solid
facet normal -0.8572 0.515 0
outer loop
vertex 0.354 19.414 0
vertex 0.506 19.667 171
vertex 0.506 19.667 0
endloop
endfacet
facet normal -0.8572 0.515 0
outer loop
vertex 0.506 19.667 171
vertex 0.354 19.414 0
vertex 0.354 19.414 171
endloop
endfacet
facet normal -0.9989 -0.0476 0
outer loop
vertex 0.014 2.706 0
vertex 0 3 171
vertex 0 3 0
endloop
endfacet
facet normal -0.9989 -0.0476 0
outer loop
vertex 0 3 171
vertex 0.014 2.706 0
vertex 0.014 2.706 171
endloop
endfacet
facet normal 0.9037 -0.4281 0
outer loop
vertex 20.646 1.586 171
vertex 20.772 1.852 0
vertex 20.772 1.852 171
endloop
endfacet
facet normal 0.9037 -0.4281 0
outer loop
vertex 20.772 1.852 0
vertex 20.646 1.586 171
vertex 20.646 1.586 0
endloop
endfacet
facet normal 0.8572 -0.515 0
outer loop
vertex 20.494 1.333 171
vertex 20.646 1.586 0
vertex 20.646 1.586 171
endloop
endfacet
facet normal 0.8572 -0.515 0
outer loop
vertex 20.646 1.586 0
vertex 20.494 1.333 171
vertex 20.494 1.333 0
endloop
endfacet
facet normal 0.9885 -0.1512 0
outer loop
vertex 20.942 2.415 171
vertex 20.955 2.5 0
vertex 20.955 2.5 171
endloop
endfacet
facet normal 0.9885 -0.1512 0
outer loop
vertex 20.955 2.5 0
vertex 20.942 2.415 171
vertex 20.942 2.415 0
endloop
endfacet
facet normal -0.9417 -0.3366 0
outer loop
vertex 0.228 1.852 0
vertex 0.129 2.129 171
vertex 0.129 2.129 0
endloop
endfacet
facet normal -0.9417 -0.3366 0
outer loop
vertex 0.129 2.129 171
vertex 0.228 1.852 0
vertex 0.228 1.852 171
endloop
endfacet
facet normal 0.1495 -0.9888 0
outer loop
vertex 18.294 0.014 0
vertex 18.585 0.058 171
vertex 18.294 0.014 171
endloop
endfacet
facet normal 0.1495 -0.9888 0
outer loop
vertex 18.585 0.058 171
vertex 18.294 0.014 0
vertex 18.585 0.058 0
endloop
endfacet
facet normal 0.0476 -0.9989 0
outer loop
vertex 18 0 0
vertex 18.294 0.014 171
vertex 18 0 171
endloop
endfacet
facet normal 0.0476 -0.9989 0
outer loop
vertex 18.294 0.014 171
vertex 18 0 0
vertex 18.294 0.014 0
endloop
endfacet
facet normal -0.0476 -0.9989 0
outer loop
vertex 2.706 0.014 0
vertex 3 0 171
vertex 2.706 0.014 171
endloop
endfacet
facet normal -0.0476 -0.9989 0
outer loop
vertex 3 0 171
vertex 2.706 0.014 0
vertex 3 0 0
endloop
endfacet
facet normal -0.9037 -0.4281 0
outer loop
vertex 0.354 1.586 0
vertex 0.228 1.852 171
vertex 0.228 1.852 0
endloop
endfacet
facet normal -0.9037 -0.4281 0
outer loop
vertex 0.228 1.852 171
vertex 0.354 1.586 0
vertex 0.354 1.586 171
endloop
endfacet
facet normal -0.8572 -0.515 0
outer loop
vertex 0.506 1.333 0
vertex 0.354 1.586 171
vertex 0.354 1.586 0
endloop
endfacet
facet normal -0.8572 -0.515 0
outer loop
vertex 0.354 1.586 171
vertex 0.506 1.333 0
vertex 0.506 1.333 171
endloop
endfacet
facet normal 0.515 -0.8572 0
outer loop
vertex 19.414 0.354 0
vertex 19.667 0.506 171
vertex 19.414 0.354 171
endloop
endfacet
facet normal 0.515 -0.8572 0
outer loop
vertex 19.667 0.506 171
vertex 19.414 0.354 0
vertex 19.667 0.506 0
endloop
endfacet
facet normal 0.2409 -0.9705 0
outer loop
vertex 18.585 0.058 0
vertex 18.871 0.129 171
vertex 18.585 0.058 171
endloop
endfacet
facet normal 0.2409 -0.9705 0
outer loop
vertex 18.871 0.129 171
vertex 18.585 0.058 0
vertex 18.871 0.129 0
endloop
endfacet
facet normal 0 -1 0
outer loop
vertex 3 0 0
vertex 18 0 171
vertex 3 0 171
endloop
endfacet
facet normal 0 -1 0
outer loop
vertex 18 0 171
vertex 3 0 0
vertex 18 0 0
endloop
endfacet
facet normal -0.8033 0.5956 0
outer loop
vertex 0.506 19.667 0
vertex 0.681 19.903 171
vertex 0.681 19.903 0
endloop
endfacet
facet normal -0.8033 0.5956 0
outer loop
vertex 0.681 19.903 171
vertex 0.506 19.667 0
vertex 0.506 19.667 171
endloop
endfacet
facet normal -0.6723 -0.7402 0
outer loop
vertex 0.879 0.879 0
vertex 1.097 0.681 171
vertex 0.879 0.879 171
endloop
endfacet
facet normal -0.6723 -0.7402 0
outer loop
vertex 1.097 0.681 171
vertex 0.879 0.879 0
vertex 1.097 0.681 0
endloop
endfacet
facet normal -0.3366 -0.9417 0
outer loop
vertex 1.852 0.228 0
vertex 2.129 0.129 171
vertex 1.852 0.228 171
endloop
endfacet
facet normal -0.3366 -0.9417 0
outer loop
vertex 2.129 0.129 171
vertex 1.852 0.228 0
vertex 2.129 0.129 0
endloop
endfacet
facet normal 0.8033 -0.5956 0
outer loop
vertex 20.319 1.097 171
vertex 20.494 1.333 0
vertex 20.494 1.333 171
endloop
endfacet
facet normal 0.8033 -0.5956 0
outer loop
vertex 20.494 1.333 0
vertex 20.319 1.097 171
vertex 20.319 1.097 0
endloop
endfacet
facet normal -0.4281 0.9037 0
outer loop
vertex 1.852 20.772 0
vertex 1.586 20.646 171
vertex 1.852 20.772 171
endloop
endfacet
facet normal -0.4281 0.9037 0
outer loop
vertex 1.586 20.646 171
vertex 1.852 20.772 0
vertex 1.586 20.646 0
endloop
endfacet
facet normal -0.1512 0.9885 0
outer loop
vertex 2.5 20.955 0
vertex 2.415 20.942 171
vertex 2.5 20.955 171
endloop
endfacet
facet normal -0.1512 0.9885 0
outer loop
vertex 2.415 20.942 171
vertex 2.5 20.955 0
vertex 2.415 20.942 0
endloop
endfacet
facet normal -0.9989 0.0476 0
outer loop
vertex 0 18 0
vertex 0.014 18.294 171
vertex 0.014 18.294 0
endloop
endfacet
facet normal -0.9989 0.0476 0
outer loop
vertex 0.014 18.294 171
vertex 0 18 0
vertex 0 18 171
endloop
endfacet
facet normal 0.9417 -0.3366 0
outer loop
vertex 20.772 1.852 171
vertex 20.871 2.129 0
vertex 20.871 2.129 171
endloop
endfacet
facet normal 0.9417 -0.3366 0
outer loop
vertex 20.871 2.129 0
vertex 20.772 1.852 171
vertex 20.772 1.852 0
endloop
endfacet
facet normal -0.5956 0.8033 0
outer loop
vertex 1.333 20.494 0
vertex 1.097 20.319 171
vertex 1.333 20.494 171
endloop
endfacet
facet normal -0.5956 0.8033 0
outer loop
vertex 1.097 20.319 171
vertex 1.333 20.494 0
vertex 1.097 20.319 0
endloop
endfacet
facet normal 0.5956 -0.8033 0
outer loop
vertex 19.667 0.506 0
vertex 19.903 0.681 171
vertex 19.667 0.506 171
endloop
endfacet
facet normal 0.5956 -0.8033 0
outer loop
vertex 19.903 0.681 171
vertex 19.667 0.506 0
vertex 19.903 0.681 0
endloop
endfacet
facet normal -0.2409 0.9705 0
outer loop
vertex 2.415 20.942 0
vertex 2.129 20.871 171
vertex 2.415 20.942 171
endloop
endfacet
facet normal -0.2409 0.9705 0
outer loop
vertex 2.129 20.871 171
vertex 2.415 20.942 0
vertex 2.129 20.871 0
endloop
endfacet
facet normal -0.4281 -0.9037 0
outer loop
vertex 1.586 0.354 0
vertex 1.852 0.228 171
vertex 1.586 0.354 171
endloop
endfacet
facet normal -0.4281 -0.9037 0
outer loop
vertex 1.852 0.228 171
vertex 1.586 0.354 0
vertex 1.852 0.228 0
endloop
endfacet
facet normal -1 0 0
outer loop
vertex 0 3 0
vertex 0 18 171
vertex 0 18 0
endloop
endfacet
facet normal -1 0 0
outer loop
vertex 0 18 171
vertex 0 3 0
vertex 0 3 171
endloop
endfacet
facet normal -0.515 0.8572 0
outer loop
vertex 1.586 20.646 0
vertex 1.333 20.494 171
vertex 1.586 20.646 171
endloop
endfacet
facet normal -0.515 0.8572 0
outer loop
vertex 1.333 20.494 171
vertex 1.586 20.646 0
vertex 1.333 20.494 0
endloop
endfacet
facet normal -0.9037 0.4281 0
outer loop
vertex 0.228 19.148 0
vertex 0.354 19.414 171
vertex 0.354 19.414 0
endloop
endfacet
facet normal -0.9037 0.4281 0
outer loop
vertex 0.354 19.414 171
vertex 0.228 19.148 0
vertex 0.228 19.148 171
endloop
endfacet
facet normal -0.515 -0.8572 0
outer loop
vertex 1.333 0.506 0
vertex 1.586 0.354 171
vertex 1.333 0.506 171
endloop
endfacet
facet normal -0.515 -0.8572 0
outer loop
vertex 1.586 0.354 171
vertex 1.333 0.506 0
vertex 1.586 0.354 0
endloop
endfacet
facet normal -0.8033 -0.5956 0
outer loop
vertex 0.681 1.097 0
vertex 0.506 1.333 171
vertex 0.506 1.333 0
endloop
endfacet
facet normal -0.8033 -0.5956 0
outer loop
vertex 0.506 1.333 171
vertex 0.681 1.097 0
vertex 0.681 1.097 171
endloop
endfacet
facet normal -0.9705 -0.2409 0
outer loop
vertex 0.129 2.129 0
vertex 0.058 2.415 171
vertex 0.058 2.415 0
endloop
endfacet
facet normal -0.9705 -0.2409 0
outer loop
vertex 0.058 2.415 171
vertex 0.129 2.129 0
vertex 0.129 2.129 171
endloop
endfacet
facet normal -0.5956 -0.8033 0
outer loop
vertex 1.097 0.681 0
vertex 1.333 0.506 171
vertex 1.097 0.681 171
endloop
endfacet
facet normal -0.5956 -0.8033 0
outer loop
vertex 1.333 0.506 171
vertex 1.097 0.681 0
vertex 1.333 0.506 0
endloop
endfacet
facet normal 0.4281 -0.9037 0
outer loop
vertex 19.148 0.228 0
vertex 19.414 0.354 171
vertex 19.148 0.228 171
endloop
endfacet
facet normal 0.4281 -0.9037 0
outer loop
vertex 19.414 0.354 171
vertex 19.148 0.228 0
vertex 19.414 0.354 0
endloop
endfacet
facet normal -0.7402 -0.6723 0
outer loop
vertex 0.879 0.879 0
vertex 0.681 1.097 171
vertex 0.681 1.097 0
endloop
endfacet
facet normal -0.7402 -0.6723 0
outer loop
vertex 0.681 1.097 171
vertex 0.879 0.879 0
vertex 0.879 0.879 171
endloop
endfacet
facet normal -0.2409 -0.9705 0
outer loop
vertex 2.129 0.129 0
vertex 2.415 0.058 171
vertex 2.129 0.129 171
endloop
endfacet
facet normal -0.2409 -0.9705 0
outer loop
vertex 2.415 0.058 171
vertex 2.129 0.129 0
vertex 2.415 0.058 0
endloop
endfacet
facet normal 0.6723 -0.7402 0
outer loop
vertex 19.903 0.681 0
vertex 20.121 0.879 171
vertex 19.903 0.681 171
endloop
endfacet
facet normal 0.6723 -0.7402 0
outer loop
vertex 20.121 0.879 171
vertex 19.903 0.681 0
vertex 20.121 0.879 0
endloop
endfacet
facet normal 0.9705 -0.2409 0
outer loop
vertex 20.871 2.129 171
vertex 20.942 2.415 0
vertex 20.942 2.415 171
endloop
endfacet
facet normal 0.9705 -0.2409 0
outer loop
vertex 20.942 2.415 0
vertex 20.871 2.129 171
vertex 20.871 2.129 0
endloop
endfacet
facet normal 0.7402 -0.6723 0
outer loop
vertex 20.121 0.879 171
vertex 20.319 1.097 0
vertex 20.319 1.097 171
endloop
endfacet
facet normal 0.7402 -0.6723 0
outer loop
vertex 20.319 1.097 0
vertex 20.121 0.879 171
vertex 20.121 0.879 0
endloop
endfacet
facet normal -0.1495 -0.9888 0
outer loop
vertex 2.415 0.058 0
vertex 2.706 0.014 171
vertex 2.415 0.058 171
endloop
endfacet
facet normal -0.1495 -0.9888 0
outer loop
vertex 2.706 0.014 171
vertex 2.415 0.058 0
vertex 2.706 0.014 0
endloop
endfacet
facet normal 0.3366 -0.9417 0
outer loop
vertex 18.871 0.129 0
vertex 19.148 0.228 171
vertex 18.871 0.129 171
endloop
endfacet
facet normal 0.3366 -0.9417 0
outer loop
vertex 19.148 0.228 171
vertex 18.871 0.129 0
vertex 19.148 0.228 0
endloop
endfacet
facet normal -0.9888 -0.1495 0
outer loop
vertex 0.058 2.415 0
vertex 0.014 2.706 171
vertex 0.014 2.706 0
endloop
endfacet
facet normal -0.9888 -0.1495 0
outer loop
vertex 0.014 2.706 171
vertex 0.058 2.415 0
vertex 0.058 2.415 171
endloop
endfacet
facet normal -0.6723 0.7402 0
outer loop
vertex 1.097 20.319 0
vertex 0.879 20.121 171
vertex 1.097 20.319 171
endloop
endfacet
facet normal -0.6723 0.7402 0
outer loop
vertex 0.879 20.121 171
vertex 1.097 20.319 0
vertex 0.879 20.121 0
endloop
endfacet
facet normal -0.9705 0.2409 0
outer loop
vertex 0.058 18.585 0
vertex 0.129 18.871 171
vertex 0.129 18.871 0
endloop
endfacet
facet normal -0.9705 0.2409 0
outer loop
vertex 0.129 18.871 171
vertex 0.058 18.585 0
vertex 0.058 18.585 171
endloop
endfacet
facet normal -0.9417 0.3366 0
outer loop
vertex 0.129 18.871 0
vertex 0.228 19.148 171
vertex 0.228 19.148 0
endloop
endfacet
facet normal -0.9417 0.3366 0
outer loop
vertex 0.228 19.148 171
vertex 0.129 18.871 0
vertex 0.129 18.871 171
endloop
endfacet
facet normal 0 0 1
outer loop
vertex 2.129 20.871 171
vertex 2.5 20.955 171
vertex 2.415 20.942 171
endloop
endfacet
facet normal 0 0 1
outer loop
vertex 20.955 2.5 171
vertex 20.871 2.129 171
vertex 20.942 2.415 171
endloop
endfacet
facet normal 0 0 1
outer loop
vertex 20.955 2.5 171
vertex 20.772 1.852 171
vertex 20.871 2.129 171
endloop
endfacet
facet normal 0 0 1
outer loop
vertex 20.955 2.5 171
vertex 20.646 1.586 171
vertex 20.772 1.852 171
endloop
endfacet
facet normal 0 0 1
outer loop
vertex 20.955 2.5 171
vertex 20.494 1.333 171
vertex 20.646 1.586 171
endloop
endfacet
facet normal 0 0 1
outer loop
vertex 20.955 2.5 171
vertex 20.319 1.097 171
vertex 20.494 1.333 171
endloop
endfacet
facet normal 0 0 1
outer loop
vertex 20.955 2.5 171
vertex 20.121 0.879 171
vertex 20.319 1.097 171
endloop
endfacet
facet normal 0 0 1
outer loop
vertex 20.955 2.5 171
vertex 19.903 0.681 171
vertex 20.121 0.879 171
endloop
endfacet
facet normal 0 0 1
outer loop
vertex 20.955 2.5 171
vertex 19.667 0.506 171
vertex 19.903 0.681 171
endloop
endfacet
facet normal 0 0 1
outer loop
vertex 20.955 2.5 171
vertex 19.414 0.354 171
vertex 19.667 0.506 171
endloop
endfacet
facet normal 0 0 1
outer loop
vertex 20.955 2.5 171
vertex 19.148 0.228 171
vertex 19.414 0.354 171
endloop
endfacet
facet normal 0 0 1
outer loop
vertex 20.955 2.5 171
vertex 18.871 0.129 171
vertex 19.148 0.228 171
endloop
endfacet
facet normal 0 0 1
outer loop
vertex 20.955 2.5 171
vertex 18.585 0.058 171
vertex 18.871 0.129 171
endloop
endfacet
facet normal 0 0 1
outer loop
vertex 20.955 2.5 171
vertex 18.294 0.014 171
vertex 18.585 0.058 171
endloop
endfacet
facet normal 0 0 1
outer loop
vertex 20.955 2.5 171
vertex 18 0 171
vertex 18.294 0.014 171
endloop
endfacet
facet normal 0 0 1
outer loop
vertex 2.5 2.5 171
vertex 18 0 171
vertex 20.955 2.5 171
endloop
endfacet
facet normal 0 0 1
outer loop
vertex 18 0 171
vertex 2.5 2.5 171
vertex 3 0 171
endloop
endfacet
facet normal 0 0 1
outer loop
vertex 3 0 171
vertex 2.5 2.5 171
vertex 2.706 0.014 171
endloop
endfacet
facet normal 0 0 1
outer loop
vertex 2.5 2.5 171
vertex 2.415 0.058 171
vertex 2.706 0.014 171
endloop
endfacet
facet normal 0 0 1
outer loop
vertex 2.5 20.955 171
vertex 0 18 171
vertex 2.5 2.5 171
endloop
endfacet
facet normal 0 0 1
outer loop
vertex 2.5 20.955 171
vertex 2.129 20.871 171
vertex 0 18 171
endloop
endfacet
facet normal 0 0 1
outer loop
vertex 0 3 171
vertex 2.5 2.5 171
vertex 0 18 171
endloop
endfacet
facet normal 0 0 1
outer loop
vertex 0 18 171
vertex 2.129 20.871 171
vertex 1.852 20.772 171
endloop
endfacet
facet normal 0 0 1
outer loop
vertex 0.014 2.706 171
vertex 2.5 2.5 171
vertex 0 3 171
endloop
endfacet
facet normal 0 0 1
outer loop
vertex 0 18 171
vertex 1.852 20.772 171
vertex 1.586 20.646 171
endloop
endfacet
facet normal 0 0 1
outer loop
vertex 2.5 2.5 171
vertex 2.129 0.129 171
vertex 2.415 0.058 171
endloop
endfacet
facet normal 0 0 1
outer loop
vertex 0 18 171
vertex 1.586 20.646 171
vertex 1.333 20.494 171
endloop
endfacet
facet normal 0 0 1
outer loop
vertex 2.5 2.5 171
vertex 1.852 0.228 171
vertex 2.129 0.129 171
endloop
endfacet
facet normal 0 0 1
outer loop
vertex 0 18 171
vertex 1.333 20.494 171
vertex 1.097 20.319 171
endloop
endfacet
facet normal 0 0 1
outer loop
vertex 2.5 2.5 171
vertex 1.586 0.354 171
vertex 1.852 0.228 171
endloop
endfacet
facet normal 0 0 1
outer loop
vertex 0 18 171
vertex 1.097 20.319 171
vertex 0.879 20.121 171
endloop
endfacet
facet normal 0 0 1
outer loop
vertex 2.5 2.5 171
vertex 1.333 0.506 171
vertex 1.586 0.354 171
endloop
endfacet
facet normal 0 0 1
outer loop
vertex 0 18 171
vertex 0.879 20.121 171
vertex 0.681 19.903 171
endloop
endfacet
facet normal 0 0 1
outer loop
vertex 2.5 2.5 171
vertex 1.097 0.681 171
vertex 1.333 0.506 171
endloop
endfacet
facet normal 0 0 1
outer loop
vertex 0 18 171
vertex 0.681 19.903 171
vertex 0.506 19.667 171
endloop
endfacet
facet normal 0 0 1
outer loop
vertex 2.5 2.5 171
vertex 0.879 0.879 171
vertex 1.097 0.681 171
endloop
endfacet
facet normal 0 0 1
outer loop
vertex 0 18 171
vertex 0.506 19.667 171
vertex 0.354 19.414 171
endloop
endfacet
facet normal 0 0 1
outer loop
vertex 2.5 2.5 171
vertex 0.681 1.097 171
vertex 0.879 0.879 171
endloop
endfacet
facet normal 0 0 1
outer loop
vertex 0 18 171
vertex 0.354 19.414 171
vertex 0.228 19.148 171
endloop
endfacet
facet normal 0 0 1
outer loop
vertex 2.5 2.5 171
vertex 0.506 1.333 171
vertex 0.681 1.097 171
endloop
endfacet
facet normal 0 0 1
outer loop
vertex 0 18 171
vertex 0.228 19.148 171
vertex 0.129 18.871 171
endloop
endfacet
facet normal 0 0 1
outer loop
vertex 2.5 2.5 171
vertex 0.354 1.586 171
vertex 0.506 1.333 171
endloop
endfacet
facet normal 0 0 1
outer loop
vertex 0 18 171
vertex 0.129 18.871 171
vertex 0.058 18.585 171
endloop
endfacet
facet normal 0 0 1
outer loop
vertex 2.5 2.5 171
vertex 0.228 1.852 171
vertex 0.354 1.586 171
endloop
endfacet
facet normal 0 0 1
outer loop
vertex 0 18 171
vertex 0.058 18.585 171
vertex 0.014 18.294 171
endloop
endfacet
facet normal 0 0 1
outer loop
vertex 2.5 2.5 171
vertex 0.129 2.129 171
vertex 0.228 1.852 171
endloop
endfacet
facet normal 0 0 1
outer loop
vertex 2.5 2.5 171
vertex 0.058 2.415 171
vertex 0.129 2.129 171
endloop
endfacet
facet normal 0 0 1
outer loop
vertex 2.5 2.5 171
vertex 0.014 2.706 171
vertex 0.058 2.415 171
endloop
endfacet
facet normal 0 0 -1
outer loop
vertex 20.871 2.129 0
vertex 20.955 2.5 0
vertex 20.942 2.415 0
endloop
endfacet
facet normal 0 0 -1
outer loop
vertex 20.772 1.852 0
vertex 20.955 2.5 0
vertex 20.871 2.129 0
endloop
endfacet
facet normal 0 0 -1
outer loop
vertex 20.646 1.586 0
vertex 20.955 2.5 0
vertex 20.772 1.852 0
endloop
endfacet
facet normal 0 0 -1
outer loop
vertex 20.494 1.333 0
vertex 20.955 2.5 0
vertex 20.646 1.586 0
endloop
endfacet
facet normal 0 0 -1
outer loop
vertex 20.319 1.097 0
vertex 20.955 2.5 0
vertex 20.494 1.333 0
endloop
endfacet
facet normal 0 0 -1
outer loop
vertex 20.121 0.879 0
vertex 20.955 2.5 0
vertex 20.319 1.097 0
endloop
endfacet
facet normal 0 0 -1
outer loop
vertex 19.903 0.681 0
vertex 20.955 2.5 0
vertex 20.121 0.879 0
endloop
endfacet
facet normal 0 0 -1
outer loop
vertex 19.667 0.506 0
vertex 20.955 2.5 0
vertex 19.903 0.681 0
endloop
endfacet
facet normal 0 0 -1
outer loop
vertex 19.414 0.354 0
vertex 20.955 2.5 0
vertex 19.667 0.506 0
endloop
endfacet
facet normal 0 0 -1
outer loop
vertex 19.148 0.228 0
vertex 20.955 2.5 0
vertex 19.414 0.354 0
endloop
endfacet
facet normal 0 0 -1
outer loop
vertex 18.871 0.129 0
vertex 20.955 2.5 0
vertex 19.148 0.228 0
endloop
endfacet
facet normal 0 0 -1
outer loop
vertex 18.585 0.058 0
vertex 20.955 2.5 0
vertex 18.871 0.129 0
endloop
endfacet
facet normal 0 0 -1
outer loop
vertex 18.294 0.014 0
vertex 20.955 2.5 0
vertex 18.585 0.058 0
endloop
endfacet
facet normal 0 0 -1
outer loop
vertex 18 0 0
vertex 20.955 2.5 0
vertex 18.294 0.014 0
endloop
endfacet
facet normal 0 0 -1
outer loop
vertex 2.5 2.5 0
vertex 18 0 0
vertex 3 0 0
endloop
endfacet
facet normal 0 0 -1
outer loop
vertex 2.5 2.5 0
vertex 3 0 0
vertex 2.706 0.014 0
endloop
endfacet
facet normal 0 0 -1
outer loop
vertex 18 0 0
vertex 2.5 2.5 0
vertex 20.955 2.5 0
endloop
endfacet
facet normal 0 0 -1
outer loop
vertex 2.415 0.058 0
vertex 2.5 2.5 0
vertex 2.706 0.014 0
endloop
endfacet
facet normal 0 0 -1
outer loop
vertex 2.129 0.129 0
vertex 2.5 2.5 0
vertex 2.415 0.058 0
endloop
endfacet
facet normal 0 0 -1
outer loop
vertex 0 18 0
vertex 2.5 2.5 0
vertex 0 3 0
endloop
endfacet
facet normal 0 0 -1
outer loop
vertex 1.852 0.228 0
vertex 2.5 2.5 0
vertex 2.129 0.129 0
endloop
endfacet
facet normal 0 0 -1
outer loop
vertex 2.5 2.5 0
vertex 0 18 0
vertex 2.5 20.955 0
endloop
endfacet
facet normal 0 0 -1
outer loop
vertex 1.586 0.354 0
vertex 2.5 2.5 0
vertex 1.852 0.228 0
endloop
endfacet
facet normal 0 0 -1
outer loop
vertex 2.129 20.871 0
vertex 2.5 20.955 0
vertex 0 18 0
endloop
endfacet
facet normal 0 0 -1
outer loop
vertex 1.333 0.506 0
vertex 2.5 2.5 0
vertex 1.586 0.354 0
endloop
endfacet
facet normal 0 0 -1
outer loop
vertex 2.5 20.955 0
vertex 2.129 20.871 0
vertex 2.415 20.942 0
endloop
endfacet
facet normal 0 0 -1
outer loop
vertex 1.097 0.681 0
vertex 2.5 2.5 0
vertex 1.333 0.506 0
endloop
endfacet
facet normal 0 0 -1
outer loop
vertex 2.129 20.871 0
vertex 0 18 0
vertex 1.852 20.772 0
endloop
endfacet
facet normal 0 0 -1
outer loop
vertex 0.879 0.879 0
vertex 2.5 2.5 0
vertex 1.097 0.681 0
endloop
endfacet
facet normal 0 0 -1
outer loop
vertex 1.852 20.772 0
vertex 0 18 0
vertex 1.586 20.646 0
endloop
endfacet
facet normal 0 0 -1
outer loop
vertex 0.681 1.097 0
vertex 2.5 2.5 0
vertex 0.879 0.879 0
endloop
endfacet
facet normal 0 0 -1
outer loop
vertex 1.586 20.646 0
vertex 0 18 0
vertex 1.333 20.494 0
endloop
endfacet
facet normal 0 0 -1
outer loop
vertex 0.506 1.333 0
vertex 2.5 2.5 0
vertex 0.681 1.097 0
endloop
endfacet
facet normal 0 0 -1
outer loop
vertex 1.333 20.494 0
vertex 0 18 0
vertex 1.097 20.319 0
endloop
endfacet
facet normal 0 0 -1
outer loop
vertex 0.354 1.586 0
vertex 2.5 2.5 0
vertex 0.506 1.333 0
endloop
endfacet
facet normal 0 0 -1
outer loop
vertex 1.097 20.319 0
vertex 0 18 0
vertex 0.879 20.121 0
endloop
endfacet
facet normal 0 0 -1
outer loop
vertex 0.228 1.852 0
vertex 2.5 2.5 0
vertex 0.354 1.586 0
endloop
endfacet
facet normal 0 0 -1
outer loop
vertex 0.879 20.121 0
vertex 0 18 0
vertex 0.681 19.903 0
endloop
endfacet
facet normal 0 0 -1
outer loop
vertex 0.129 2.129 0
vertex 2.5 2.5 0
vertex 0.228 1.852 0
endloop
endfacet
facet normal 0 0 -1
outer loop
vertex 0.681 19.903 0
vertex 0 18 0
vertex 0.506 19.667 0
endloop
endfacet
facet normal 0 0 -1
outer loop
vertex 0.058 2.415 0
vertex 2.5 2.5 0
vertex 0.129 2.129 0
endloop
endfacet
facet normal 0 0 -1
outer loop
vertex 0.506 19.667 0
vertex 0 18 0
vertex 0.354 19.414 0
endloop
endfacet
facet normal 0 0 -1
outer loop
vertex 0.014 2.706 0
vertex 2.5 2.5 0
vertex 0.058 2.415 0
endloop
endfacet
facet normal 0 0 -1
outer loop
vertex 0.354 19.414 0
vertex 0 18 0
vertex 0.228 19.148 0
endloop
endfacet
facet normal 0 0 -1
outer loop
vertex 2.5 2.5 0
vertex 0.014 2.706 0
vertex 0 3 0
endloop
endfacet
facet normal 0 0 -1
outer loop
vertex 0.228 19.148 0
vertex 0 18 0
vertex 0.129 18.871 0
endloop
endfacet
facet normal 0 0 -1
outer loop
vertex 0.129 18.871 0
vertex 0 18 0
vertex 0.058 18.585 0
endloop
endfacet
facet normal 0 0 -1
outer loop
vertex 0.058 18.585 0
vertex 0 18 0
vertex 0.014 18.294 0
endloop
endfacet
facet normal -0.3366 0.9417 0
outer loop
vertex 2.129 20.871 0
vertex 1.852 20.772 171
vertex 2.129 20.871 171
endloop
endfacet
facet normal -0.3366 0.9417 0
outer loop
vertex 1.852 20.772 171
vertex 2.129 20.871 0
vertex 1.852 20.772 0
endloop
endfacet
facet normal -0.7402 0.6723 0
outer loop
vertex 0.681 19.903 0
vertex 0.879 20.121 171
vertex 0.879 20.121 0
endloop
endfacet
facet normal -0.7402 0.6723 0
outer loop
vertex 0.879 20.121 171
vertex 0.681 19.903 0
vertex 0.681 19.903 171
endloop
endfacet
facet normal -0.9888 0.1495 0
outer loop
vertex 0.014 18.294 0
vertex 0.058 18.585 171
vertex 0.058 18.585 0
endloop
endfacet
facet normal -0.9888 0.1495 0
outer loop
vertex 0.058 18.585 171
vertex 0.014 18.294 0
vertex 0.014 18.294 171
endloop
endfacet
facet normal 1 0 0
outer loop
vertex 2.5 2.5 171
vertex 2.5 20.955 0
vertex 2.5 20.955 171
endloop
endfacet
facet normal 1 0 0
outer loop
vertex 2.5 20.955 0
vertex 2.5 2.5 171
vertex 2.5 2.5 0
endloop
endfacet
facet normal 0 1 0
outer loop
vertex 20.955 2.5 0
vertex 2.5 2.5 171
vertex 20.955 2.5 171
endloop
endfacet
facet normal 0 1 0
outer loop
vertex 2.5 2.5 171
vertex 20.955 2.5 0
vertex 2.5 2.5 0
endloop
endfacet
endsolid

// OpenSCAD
$fn=64;
difference(){
minkowski(){
translate([3,3,0])
cylinder(h=170,r=3,center=false);
cube([15,15,1]);
}

translate([2.5,2.5,0])
#cube([20,20,172,]);
}
